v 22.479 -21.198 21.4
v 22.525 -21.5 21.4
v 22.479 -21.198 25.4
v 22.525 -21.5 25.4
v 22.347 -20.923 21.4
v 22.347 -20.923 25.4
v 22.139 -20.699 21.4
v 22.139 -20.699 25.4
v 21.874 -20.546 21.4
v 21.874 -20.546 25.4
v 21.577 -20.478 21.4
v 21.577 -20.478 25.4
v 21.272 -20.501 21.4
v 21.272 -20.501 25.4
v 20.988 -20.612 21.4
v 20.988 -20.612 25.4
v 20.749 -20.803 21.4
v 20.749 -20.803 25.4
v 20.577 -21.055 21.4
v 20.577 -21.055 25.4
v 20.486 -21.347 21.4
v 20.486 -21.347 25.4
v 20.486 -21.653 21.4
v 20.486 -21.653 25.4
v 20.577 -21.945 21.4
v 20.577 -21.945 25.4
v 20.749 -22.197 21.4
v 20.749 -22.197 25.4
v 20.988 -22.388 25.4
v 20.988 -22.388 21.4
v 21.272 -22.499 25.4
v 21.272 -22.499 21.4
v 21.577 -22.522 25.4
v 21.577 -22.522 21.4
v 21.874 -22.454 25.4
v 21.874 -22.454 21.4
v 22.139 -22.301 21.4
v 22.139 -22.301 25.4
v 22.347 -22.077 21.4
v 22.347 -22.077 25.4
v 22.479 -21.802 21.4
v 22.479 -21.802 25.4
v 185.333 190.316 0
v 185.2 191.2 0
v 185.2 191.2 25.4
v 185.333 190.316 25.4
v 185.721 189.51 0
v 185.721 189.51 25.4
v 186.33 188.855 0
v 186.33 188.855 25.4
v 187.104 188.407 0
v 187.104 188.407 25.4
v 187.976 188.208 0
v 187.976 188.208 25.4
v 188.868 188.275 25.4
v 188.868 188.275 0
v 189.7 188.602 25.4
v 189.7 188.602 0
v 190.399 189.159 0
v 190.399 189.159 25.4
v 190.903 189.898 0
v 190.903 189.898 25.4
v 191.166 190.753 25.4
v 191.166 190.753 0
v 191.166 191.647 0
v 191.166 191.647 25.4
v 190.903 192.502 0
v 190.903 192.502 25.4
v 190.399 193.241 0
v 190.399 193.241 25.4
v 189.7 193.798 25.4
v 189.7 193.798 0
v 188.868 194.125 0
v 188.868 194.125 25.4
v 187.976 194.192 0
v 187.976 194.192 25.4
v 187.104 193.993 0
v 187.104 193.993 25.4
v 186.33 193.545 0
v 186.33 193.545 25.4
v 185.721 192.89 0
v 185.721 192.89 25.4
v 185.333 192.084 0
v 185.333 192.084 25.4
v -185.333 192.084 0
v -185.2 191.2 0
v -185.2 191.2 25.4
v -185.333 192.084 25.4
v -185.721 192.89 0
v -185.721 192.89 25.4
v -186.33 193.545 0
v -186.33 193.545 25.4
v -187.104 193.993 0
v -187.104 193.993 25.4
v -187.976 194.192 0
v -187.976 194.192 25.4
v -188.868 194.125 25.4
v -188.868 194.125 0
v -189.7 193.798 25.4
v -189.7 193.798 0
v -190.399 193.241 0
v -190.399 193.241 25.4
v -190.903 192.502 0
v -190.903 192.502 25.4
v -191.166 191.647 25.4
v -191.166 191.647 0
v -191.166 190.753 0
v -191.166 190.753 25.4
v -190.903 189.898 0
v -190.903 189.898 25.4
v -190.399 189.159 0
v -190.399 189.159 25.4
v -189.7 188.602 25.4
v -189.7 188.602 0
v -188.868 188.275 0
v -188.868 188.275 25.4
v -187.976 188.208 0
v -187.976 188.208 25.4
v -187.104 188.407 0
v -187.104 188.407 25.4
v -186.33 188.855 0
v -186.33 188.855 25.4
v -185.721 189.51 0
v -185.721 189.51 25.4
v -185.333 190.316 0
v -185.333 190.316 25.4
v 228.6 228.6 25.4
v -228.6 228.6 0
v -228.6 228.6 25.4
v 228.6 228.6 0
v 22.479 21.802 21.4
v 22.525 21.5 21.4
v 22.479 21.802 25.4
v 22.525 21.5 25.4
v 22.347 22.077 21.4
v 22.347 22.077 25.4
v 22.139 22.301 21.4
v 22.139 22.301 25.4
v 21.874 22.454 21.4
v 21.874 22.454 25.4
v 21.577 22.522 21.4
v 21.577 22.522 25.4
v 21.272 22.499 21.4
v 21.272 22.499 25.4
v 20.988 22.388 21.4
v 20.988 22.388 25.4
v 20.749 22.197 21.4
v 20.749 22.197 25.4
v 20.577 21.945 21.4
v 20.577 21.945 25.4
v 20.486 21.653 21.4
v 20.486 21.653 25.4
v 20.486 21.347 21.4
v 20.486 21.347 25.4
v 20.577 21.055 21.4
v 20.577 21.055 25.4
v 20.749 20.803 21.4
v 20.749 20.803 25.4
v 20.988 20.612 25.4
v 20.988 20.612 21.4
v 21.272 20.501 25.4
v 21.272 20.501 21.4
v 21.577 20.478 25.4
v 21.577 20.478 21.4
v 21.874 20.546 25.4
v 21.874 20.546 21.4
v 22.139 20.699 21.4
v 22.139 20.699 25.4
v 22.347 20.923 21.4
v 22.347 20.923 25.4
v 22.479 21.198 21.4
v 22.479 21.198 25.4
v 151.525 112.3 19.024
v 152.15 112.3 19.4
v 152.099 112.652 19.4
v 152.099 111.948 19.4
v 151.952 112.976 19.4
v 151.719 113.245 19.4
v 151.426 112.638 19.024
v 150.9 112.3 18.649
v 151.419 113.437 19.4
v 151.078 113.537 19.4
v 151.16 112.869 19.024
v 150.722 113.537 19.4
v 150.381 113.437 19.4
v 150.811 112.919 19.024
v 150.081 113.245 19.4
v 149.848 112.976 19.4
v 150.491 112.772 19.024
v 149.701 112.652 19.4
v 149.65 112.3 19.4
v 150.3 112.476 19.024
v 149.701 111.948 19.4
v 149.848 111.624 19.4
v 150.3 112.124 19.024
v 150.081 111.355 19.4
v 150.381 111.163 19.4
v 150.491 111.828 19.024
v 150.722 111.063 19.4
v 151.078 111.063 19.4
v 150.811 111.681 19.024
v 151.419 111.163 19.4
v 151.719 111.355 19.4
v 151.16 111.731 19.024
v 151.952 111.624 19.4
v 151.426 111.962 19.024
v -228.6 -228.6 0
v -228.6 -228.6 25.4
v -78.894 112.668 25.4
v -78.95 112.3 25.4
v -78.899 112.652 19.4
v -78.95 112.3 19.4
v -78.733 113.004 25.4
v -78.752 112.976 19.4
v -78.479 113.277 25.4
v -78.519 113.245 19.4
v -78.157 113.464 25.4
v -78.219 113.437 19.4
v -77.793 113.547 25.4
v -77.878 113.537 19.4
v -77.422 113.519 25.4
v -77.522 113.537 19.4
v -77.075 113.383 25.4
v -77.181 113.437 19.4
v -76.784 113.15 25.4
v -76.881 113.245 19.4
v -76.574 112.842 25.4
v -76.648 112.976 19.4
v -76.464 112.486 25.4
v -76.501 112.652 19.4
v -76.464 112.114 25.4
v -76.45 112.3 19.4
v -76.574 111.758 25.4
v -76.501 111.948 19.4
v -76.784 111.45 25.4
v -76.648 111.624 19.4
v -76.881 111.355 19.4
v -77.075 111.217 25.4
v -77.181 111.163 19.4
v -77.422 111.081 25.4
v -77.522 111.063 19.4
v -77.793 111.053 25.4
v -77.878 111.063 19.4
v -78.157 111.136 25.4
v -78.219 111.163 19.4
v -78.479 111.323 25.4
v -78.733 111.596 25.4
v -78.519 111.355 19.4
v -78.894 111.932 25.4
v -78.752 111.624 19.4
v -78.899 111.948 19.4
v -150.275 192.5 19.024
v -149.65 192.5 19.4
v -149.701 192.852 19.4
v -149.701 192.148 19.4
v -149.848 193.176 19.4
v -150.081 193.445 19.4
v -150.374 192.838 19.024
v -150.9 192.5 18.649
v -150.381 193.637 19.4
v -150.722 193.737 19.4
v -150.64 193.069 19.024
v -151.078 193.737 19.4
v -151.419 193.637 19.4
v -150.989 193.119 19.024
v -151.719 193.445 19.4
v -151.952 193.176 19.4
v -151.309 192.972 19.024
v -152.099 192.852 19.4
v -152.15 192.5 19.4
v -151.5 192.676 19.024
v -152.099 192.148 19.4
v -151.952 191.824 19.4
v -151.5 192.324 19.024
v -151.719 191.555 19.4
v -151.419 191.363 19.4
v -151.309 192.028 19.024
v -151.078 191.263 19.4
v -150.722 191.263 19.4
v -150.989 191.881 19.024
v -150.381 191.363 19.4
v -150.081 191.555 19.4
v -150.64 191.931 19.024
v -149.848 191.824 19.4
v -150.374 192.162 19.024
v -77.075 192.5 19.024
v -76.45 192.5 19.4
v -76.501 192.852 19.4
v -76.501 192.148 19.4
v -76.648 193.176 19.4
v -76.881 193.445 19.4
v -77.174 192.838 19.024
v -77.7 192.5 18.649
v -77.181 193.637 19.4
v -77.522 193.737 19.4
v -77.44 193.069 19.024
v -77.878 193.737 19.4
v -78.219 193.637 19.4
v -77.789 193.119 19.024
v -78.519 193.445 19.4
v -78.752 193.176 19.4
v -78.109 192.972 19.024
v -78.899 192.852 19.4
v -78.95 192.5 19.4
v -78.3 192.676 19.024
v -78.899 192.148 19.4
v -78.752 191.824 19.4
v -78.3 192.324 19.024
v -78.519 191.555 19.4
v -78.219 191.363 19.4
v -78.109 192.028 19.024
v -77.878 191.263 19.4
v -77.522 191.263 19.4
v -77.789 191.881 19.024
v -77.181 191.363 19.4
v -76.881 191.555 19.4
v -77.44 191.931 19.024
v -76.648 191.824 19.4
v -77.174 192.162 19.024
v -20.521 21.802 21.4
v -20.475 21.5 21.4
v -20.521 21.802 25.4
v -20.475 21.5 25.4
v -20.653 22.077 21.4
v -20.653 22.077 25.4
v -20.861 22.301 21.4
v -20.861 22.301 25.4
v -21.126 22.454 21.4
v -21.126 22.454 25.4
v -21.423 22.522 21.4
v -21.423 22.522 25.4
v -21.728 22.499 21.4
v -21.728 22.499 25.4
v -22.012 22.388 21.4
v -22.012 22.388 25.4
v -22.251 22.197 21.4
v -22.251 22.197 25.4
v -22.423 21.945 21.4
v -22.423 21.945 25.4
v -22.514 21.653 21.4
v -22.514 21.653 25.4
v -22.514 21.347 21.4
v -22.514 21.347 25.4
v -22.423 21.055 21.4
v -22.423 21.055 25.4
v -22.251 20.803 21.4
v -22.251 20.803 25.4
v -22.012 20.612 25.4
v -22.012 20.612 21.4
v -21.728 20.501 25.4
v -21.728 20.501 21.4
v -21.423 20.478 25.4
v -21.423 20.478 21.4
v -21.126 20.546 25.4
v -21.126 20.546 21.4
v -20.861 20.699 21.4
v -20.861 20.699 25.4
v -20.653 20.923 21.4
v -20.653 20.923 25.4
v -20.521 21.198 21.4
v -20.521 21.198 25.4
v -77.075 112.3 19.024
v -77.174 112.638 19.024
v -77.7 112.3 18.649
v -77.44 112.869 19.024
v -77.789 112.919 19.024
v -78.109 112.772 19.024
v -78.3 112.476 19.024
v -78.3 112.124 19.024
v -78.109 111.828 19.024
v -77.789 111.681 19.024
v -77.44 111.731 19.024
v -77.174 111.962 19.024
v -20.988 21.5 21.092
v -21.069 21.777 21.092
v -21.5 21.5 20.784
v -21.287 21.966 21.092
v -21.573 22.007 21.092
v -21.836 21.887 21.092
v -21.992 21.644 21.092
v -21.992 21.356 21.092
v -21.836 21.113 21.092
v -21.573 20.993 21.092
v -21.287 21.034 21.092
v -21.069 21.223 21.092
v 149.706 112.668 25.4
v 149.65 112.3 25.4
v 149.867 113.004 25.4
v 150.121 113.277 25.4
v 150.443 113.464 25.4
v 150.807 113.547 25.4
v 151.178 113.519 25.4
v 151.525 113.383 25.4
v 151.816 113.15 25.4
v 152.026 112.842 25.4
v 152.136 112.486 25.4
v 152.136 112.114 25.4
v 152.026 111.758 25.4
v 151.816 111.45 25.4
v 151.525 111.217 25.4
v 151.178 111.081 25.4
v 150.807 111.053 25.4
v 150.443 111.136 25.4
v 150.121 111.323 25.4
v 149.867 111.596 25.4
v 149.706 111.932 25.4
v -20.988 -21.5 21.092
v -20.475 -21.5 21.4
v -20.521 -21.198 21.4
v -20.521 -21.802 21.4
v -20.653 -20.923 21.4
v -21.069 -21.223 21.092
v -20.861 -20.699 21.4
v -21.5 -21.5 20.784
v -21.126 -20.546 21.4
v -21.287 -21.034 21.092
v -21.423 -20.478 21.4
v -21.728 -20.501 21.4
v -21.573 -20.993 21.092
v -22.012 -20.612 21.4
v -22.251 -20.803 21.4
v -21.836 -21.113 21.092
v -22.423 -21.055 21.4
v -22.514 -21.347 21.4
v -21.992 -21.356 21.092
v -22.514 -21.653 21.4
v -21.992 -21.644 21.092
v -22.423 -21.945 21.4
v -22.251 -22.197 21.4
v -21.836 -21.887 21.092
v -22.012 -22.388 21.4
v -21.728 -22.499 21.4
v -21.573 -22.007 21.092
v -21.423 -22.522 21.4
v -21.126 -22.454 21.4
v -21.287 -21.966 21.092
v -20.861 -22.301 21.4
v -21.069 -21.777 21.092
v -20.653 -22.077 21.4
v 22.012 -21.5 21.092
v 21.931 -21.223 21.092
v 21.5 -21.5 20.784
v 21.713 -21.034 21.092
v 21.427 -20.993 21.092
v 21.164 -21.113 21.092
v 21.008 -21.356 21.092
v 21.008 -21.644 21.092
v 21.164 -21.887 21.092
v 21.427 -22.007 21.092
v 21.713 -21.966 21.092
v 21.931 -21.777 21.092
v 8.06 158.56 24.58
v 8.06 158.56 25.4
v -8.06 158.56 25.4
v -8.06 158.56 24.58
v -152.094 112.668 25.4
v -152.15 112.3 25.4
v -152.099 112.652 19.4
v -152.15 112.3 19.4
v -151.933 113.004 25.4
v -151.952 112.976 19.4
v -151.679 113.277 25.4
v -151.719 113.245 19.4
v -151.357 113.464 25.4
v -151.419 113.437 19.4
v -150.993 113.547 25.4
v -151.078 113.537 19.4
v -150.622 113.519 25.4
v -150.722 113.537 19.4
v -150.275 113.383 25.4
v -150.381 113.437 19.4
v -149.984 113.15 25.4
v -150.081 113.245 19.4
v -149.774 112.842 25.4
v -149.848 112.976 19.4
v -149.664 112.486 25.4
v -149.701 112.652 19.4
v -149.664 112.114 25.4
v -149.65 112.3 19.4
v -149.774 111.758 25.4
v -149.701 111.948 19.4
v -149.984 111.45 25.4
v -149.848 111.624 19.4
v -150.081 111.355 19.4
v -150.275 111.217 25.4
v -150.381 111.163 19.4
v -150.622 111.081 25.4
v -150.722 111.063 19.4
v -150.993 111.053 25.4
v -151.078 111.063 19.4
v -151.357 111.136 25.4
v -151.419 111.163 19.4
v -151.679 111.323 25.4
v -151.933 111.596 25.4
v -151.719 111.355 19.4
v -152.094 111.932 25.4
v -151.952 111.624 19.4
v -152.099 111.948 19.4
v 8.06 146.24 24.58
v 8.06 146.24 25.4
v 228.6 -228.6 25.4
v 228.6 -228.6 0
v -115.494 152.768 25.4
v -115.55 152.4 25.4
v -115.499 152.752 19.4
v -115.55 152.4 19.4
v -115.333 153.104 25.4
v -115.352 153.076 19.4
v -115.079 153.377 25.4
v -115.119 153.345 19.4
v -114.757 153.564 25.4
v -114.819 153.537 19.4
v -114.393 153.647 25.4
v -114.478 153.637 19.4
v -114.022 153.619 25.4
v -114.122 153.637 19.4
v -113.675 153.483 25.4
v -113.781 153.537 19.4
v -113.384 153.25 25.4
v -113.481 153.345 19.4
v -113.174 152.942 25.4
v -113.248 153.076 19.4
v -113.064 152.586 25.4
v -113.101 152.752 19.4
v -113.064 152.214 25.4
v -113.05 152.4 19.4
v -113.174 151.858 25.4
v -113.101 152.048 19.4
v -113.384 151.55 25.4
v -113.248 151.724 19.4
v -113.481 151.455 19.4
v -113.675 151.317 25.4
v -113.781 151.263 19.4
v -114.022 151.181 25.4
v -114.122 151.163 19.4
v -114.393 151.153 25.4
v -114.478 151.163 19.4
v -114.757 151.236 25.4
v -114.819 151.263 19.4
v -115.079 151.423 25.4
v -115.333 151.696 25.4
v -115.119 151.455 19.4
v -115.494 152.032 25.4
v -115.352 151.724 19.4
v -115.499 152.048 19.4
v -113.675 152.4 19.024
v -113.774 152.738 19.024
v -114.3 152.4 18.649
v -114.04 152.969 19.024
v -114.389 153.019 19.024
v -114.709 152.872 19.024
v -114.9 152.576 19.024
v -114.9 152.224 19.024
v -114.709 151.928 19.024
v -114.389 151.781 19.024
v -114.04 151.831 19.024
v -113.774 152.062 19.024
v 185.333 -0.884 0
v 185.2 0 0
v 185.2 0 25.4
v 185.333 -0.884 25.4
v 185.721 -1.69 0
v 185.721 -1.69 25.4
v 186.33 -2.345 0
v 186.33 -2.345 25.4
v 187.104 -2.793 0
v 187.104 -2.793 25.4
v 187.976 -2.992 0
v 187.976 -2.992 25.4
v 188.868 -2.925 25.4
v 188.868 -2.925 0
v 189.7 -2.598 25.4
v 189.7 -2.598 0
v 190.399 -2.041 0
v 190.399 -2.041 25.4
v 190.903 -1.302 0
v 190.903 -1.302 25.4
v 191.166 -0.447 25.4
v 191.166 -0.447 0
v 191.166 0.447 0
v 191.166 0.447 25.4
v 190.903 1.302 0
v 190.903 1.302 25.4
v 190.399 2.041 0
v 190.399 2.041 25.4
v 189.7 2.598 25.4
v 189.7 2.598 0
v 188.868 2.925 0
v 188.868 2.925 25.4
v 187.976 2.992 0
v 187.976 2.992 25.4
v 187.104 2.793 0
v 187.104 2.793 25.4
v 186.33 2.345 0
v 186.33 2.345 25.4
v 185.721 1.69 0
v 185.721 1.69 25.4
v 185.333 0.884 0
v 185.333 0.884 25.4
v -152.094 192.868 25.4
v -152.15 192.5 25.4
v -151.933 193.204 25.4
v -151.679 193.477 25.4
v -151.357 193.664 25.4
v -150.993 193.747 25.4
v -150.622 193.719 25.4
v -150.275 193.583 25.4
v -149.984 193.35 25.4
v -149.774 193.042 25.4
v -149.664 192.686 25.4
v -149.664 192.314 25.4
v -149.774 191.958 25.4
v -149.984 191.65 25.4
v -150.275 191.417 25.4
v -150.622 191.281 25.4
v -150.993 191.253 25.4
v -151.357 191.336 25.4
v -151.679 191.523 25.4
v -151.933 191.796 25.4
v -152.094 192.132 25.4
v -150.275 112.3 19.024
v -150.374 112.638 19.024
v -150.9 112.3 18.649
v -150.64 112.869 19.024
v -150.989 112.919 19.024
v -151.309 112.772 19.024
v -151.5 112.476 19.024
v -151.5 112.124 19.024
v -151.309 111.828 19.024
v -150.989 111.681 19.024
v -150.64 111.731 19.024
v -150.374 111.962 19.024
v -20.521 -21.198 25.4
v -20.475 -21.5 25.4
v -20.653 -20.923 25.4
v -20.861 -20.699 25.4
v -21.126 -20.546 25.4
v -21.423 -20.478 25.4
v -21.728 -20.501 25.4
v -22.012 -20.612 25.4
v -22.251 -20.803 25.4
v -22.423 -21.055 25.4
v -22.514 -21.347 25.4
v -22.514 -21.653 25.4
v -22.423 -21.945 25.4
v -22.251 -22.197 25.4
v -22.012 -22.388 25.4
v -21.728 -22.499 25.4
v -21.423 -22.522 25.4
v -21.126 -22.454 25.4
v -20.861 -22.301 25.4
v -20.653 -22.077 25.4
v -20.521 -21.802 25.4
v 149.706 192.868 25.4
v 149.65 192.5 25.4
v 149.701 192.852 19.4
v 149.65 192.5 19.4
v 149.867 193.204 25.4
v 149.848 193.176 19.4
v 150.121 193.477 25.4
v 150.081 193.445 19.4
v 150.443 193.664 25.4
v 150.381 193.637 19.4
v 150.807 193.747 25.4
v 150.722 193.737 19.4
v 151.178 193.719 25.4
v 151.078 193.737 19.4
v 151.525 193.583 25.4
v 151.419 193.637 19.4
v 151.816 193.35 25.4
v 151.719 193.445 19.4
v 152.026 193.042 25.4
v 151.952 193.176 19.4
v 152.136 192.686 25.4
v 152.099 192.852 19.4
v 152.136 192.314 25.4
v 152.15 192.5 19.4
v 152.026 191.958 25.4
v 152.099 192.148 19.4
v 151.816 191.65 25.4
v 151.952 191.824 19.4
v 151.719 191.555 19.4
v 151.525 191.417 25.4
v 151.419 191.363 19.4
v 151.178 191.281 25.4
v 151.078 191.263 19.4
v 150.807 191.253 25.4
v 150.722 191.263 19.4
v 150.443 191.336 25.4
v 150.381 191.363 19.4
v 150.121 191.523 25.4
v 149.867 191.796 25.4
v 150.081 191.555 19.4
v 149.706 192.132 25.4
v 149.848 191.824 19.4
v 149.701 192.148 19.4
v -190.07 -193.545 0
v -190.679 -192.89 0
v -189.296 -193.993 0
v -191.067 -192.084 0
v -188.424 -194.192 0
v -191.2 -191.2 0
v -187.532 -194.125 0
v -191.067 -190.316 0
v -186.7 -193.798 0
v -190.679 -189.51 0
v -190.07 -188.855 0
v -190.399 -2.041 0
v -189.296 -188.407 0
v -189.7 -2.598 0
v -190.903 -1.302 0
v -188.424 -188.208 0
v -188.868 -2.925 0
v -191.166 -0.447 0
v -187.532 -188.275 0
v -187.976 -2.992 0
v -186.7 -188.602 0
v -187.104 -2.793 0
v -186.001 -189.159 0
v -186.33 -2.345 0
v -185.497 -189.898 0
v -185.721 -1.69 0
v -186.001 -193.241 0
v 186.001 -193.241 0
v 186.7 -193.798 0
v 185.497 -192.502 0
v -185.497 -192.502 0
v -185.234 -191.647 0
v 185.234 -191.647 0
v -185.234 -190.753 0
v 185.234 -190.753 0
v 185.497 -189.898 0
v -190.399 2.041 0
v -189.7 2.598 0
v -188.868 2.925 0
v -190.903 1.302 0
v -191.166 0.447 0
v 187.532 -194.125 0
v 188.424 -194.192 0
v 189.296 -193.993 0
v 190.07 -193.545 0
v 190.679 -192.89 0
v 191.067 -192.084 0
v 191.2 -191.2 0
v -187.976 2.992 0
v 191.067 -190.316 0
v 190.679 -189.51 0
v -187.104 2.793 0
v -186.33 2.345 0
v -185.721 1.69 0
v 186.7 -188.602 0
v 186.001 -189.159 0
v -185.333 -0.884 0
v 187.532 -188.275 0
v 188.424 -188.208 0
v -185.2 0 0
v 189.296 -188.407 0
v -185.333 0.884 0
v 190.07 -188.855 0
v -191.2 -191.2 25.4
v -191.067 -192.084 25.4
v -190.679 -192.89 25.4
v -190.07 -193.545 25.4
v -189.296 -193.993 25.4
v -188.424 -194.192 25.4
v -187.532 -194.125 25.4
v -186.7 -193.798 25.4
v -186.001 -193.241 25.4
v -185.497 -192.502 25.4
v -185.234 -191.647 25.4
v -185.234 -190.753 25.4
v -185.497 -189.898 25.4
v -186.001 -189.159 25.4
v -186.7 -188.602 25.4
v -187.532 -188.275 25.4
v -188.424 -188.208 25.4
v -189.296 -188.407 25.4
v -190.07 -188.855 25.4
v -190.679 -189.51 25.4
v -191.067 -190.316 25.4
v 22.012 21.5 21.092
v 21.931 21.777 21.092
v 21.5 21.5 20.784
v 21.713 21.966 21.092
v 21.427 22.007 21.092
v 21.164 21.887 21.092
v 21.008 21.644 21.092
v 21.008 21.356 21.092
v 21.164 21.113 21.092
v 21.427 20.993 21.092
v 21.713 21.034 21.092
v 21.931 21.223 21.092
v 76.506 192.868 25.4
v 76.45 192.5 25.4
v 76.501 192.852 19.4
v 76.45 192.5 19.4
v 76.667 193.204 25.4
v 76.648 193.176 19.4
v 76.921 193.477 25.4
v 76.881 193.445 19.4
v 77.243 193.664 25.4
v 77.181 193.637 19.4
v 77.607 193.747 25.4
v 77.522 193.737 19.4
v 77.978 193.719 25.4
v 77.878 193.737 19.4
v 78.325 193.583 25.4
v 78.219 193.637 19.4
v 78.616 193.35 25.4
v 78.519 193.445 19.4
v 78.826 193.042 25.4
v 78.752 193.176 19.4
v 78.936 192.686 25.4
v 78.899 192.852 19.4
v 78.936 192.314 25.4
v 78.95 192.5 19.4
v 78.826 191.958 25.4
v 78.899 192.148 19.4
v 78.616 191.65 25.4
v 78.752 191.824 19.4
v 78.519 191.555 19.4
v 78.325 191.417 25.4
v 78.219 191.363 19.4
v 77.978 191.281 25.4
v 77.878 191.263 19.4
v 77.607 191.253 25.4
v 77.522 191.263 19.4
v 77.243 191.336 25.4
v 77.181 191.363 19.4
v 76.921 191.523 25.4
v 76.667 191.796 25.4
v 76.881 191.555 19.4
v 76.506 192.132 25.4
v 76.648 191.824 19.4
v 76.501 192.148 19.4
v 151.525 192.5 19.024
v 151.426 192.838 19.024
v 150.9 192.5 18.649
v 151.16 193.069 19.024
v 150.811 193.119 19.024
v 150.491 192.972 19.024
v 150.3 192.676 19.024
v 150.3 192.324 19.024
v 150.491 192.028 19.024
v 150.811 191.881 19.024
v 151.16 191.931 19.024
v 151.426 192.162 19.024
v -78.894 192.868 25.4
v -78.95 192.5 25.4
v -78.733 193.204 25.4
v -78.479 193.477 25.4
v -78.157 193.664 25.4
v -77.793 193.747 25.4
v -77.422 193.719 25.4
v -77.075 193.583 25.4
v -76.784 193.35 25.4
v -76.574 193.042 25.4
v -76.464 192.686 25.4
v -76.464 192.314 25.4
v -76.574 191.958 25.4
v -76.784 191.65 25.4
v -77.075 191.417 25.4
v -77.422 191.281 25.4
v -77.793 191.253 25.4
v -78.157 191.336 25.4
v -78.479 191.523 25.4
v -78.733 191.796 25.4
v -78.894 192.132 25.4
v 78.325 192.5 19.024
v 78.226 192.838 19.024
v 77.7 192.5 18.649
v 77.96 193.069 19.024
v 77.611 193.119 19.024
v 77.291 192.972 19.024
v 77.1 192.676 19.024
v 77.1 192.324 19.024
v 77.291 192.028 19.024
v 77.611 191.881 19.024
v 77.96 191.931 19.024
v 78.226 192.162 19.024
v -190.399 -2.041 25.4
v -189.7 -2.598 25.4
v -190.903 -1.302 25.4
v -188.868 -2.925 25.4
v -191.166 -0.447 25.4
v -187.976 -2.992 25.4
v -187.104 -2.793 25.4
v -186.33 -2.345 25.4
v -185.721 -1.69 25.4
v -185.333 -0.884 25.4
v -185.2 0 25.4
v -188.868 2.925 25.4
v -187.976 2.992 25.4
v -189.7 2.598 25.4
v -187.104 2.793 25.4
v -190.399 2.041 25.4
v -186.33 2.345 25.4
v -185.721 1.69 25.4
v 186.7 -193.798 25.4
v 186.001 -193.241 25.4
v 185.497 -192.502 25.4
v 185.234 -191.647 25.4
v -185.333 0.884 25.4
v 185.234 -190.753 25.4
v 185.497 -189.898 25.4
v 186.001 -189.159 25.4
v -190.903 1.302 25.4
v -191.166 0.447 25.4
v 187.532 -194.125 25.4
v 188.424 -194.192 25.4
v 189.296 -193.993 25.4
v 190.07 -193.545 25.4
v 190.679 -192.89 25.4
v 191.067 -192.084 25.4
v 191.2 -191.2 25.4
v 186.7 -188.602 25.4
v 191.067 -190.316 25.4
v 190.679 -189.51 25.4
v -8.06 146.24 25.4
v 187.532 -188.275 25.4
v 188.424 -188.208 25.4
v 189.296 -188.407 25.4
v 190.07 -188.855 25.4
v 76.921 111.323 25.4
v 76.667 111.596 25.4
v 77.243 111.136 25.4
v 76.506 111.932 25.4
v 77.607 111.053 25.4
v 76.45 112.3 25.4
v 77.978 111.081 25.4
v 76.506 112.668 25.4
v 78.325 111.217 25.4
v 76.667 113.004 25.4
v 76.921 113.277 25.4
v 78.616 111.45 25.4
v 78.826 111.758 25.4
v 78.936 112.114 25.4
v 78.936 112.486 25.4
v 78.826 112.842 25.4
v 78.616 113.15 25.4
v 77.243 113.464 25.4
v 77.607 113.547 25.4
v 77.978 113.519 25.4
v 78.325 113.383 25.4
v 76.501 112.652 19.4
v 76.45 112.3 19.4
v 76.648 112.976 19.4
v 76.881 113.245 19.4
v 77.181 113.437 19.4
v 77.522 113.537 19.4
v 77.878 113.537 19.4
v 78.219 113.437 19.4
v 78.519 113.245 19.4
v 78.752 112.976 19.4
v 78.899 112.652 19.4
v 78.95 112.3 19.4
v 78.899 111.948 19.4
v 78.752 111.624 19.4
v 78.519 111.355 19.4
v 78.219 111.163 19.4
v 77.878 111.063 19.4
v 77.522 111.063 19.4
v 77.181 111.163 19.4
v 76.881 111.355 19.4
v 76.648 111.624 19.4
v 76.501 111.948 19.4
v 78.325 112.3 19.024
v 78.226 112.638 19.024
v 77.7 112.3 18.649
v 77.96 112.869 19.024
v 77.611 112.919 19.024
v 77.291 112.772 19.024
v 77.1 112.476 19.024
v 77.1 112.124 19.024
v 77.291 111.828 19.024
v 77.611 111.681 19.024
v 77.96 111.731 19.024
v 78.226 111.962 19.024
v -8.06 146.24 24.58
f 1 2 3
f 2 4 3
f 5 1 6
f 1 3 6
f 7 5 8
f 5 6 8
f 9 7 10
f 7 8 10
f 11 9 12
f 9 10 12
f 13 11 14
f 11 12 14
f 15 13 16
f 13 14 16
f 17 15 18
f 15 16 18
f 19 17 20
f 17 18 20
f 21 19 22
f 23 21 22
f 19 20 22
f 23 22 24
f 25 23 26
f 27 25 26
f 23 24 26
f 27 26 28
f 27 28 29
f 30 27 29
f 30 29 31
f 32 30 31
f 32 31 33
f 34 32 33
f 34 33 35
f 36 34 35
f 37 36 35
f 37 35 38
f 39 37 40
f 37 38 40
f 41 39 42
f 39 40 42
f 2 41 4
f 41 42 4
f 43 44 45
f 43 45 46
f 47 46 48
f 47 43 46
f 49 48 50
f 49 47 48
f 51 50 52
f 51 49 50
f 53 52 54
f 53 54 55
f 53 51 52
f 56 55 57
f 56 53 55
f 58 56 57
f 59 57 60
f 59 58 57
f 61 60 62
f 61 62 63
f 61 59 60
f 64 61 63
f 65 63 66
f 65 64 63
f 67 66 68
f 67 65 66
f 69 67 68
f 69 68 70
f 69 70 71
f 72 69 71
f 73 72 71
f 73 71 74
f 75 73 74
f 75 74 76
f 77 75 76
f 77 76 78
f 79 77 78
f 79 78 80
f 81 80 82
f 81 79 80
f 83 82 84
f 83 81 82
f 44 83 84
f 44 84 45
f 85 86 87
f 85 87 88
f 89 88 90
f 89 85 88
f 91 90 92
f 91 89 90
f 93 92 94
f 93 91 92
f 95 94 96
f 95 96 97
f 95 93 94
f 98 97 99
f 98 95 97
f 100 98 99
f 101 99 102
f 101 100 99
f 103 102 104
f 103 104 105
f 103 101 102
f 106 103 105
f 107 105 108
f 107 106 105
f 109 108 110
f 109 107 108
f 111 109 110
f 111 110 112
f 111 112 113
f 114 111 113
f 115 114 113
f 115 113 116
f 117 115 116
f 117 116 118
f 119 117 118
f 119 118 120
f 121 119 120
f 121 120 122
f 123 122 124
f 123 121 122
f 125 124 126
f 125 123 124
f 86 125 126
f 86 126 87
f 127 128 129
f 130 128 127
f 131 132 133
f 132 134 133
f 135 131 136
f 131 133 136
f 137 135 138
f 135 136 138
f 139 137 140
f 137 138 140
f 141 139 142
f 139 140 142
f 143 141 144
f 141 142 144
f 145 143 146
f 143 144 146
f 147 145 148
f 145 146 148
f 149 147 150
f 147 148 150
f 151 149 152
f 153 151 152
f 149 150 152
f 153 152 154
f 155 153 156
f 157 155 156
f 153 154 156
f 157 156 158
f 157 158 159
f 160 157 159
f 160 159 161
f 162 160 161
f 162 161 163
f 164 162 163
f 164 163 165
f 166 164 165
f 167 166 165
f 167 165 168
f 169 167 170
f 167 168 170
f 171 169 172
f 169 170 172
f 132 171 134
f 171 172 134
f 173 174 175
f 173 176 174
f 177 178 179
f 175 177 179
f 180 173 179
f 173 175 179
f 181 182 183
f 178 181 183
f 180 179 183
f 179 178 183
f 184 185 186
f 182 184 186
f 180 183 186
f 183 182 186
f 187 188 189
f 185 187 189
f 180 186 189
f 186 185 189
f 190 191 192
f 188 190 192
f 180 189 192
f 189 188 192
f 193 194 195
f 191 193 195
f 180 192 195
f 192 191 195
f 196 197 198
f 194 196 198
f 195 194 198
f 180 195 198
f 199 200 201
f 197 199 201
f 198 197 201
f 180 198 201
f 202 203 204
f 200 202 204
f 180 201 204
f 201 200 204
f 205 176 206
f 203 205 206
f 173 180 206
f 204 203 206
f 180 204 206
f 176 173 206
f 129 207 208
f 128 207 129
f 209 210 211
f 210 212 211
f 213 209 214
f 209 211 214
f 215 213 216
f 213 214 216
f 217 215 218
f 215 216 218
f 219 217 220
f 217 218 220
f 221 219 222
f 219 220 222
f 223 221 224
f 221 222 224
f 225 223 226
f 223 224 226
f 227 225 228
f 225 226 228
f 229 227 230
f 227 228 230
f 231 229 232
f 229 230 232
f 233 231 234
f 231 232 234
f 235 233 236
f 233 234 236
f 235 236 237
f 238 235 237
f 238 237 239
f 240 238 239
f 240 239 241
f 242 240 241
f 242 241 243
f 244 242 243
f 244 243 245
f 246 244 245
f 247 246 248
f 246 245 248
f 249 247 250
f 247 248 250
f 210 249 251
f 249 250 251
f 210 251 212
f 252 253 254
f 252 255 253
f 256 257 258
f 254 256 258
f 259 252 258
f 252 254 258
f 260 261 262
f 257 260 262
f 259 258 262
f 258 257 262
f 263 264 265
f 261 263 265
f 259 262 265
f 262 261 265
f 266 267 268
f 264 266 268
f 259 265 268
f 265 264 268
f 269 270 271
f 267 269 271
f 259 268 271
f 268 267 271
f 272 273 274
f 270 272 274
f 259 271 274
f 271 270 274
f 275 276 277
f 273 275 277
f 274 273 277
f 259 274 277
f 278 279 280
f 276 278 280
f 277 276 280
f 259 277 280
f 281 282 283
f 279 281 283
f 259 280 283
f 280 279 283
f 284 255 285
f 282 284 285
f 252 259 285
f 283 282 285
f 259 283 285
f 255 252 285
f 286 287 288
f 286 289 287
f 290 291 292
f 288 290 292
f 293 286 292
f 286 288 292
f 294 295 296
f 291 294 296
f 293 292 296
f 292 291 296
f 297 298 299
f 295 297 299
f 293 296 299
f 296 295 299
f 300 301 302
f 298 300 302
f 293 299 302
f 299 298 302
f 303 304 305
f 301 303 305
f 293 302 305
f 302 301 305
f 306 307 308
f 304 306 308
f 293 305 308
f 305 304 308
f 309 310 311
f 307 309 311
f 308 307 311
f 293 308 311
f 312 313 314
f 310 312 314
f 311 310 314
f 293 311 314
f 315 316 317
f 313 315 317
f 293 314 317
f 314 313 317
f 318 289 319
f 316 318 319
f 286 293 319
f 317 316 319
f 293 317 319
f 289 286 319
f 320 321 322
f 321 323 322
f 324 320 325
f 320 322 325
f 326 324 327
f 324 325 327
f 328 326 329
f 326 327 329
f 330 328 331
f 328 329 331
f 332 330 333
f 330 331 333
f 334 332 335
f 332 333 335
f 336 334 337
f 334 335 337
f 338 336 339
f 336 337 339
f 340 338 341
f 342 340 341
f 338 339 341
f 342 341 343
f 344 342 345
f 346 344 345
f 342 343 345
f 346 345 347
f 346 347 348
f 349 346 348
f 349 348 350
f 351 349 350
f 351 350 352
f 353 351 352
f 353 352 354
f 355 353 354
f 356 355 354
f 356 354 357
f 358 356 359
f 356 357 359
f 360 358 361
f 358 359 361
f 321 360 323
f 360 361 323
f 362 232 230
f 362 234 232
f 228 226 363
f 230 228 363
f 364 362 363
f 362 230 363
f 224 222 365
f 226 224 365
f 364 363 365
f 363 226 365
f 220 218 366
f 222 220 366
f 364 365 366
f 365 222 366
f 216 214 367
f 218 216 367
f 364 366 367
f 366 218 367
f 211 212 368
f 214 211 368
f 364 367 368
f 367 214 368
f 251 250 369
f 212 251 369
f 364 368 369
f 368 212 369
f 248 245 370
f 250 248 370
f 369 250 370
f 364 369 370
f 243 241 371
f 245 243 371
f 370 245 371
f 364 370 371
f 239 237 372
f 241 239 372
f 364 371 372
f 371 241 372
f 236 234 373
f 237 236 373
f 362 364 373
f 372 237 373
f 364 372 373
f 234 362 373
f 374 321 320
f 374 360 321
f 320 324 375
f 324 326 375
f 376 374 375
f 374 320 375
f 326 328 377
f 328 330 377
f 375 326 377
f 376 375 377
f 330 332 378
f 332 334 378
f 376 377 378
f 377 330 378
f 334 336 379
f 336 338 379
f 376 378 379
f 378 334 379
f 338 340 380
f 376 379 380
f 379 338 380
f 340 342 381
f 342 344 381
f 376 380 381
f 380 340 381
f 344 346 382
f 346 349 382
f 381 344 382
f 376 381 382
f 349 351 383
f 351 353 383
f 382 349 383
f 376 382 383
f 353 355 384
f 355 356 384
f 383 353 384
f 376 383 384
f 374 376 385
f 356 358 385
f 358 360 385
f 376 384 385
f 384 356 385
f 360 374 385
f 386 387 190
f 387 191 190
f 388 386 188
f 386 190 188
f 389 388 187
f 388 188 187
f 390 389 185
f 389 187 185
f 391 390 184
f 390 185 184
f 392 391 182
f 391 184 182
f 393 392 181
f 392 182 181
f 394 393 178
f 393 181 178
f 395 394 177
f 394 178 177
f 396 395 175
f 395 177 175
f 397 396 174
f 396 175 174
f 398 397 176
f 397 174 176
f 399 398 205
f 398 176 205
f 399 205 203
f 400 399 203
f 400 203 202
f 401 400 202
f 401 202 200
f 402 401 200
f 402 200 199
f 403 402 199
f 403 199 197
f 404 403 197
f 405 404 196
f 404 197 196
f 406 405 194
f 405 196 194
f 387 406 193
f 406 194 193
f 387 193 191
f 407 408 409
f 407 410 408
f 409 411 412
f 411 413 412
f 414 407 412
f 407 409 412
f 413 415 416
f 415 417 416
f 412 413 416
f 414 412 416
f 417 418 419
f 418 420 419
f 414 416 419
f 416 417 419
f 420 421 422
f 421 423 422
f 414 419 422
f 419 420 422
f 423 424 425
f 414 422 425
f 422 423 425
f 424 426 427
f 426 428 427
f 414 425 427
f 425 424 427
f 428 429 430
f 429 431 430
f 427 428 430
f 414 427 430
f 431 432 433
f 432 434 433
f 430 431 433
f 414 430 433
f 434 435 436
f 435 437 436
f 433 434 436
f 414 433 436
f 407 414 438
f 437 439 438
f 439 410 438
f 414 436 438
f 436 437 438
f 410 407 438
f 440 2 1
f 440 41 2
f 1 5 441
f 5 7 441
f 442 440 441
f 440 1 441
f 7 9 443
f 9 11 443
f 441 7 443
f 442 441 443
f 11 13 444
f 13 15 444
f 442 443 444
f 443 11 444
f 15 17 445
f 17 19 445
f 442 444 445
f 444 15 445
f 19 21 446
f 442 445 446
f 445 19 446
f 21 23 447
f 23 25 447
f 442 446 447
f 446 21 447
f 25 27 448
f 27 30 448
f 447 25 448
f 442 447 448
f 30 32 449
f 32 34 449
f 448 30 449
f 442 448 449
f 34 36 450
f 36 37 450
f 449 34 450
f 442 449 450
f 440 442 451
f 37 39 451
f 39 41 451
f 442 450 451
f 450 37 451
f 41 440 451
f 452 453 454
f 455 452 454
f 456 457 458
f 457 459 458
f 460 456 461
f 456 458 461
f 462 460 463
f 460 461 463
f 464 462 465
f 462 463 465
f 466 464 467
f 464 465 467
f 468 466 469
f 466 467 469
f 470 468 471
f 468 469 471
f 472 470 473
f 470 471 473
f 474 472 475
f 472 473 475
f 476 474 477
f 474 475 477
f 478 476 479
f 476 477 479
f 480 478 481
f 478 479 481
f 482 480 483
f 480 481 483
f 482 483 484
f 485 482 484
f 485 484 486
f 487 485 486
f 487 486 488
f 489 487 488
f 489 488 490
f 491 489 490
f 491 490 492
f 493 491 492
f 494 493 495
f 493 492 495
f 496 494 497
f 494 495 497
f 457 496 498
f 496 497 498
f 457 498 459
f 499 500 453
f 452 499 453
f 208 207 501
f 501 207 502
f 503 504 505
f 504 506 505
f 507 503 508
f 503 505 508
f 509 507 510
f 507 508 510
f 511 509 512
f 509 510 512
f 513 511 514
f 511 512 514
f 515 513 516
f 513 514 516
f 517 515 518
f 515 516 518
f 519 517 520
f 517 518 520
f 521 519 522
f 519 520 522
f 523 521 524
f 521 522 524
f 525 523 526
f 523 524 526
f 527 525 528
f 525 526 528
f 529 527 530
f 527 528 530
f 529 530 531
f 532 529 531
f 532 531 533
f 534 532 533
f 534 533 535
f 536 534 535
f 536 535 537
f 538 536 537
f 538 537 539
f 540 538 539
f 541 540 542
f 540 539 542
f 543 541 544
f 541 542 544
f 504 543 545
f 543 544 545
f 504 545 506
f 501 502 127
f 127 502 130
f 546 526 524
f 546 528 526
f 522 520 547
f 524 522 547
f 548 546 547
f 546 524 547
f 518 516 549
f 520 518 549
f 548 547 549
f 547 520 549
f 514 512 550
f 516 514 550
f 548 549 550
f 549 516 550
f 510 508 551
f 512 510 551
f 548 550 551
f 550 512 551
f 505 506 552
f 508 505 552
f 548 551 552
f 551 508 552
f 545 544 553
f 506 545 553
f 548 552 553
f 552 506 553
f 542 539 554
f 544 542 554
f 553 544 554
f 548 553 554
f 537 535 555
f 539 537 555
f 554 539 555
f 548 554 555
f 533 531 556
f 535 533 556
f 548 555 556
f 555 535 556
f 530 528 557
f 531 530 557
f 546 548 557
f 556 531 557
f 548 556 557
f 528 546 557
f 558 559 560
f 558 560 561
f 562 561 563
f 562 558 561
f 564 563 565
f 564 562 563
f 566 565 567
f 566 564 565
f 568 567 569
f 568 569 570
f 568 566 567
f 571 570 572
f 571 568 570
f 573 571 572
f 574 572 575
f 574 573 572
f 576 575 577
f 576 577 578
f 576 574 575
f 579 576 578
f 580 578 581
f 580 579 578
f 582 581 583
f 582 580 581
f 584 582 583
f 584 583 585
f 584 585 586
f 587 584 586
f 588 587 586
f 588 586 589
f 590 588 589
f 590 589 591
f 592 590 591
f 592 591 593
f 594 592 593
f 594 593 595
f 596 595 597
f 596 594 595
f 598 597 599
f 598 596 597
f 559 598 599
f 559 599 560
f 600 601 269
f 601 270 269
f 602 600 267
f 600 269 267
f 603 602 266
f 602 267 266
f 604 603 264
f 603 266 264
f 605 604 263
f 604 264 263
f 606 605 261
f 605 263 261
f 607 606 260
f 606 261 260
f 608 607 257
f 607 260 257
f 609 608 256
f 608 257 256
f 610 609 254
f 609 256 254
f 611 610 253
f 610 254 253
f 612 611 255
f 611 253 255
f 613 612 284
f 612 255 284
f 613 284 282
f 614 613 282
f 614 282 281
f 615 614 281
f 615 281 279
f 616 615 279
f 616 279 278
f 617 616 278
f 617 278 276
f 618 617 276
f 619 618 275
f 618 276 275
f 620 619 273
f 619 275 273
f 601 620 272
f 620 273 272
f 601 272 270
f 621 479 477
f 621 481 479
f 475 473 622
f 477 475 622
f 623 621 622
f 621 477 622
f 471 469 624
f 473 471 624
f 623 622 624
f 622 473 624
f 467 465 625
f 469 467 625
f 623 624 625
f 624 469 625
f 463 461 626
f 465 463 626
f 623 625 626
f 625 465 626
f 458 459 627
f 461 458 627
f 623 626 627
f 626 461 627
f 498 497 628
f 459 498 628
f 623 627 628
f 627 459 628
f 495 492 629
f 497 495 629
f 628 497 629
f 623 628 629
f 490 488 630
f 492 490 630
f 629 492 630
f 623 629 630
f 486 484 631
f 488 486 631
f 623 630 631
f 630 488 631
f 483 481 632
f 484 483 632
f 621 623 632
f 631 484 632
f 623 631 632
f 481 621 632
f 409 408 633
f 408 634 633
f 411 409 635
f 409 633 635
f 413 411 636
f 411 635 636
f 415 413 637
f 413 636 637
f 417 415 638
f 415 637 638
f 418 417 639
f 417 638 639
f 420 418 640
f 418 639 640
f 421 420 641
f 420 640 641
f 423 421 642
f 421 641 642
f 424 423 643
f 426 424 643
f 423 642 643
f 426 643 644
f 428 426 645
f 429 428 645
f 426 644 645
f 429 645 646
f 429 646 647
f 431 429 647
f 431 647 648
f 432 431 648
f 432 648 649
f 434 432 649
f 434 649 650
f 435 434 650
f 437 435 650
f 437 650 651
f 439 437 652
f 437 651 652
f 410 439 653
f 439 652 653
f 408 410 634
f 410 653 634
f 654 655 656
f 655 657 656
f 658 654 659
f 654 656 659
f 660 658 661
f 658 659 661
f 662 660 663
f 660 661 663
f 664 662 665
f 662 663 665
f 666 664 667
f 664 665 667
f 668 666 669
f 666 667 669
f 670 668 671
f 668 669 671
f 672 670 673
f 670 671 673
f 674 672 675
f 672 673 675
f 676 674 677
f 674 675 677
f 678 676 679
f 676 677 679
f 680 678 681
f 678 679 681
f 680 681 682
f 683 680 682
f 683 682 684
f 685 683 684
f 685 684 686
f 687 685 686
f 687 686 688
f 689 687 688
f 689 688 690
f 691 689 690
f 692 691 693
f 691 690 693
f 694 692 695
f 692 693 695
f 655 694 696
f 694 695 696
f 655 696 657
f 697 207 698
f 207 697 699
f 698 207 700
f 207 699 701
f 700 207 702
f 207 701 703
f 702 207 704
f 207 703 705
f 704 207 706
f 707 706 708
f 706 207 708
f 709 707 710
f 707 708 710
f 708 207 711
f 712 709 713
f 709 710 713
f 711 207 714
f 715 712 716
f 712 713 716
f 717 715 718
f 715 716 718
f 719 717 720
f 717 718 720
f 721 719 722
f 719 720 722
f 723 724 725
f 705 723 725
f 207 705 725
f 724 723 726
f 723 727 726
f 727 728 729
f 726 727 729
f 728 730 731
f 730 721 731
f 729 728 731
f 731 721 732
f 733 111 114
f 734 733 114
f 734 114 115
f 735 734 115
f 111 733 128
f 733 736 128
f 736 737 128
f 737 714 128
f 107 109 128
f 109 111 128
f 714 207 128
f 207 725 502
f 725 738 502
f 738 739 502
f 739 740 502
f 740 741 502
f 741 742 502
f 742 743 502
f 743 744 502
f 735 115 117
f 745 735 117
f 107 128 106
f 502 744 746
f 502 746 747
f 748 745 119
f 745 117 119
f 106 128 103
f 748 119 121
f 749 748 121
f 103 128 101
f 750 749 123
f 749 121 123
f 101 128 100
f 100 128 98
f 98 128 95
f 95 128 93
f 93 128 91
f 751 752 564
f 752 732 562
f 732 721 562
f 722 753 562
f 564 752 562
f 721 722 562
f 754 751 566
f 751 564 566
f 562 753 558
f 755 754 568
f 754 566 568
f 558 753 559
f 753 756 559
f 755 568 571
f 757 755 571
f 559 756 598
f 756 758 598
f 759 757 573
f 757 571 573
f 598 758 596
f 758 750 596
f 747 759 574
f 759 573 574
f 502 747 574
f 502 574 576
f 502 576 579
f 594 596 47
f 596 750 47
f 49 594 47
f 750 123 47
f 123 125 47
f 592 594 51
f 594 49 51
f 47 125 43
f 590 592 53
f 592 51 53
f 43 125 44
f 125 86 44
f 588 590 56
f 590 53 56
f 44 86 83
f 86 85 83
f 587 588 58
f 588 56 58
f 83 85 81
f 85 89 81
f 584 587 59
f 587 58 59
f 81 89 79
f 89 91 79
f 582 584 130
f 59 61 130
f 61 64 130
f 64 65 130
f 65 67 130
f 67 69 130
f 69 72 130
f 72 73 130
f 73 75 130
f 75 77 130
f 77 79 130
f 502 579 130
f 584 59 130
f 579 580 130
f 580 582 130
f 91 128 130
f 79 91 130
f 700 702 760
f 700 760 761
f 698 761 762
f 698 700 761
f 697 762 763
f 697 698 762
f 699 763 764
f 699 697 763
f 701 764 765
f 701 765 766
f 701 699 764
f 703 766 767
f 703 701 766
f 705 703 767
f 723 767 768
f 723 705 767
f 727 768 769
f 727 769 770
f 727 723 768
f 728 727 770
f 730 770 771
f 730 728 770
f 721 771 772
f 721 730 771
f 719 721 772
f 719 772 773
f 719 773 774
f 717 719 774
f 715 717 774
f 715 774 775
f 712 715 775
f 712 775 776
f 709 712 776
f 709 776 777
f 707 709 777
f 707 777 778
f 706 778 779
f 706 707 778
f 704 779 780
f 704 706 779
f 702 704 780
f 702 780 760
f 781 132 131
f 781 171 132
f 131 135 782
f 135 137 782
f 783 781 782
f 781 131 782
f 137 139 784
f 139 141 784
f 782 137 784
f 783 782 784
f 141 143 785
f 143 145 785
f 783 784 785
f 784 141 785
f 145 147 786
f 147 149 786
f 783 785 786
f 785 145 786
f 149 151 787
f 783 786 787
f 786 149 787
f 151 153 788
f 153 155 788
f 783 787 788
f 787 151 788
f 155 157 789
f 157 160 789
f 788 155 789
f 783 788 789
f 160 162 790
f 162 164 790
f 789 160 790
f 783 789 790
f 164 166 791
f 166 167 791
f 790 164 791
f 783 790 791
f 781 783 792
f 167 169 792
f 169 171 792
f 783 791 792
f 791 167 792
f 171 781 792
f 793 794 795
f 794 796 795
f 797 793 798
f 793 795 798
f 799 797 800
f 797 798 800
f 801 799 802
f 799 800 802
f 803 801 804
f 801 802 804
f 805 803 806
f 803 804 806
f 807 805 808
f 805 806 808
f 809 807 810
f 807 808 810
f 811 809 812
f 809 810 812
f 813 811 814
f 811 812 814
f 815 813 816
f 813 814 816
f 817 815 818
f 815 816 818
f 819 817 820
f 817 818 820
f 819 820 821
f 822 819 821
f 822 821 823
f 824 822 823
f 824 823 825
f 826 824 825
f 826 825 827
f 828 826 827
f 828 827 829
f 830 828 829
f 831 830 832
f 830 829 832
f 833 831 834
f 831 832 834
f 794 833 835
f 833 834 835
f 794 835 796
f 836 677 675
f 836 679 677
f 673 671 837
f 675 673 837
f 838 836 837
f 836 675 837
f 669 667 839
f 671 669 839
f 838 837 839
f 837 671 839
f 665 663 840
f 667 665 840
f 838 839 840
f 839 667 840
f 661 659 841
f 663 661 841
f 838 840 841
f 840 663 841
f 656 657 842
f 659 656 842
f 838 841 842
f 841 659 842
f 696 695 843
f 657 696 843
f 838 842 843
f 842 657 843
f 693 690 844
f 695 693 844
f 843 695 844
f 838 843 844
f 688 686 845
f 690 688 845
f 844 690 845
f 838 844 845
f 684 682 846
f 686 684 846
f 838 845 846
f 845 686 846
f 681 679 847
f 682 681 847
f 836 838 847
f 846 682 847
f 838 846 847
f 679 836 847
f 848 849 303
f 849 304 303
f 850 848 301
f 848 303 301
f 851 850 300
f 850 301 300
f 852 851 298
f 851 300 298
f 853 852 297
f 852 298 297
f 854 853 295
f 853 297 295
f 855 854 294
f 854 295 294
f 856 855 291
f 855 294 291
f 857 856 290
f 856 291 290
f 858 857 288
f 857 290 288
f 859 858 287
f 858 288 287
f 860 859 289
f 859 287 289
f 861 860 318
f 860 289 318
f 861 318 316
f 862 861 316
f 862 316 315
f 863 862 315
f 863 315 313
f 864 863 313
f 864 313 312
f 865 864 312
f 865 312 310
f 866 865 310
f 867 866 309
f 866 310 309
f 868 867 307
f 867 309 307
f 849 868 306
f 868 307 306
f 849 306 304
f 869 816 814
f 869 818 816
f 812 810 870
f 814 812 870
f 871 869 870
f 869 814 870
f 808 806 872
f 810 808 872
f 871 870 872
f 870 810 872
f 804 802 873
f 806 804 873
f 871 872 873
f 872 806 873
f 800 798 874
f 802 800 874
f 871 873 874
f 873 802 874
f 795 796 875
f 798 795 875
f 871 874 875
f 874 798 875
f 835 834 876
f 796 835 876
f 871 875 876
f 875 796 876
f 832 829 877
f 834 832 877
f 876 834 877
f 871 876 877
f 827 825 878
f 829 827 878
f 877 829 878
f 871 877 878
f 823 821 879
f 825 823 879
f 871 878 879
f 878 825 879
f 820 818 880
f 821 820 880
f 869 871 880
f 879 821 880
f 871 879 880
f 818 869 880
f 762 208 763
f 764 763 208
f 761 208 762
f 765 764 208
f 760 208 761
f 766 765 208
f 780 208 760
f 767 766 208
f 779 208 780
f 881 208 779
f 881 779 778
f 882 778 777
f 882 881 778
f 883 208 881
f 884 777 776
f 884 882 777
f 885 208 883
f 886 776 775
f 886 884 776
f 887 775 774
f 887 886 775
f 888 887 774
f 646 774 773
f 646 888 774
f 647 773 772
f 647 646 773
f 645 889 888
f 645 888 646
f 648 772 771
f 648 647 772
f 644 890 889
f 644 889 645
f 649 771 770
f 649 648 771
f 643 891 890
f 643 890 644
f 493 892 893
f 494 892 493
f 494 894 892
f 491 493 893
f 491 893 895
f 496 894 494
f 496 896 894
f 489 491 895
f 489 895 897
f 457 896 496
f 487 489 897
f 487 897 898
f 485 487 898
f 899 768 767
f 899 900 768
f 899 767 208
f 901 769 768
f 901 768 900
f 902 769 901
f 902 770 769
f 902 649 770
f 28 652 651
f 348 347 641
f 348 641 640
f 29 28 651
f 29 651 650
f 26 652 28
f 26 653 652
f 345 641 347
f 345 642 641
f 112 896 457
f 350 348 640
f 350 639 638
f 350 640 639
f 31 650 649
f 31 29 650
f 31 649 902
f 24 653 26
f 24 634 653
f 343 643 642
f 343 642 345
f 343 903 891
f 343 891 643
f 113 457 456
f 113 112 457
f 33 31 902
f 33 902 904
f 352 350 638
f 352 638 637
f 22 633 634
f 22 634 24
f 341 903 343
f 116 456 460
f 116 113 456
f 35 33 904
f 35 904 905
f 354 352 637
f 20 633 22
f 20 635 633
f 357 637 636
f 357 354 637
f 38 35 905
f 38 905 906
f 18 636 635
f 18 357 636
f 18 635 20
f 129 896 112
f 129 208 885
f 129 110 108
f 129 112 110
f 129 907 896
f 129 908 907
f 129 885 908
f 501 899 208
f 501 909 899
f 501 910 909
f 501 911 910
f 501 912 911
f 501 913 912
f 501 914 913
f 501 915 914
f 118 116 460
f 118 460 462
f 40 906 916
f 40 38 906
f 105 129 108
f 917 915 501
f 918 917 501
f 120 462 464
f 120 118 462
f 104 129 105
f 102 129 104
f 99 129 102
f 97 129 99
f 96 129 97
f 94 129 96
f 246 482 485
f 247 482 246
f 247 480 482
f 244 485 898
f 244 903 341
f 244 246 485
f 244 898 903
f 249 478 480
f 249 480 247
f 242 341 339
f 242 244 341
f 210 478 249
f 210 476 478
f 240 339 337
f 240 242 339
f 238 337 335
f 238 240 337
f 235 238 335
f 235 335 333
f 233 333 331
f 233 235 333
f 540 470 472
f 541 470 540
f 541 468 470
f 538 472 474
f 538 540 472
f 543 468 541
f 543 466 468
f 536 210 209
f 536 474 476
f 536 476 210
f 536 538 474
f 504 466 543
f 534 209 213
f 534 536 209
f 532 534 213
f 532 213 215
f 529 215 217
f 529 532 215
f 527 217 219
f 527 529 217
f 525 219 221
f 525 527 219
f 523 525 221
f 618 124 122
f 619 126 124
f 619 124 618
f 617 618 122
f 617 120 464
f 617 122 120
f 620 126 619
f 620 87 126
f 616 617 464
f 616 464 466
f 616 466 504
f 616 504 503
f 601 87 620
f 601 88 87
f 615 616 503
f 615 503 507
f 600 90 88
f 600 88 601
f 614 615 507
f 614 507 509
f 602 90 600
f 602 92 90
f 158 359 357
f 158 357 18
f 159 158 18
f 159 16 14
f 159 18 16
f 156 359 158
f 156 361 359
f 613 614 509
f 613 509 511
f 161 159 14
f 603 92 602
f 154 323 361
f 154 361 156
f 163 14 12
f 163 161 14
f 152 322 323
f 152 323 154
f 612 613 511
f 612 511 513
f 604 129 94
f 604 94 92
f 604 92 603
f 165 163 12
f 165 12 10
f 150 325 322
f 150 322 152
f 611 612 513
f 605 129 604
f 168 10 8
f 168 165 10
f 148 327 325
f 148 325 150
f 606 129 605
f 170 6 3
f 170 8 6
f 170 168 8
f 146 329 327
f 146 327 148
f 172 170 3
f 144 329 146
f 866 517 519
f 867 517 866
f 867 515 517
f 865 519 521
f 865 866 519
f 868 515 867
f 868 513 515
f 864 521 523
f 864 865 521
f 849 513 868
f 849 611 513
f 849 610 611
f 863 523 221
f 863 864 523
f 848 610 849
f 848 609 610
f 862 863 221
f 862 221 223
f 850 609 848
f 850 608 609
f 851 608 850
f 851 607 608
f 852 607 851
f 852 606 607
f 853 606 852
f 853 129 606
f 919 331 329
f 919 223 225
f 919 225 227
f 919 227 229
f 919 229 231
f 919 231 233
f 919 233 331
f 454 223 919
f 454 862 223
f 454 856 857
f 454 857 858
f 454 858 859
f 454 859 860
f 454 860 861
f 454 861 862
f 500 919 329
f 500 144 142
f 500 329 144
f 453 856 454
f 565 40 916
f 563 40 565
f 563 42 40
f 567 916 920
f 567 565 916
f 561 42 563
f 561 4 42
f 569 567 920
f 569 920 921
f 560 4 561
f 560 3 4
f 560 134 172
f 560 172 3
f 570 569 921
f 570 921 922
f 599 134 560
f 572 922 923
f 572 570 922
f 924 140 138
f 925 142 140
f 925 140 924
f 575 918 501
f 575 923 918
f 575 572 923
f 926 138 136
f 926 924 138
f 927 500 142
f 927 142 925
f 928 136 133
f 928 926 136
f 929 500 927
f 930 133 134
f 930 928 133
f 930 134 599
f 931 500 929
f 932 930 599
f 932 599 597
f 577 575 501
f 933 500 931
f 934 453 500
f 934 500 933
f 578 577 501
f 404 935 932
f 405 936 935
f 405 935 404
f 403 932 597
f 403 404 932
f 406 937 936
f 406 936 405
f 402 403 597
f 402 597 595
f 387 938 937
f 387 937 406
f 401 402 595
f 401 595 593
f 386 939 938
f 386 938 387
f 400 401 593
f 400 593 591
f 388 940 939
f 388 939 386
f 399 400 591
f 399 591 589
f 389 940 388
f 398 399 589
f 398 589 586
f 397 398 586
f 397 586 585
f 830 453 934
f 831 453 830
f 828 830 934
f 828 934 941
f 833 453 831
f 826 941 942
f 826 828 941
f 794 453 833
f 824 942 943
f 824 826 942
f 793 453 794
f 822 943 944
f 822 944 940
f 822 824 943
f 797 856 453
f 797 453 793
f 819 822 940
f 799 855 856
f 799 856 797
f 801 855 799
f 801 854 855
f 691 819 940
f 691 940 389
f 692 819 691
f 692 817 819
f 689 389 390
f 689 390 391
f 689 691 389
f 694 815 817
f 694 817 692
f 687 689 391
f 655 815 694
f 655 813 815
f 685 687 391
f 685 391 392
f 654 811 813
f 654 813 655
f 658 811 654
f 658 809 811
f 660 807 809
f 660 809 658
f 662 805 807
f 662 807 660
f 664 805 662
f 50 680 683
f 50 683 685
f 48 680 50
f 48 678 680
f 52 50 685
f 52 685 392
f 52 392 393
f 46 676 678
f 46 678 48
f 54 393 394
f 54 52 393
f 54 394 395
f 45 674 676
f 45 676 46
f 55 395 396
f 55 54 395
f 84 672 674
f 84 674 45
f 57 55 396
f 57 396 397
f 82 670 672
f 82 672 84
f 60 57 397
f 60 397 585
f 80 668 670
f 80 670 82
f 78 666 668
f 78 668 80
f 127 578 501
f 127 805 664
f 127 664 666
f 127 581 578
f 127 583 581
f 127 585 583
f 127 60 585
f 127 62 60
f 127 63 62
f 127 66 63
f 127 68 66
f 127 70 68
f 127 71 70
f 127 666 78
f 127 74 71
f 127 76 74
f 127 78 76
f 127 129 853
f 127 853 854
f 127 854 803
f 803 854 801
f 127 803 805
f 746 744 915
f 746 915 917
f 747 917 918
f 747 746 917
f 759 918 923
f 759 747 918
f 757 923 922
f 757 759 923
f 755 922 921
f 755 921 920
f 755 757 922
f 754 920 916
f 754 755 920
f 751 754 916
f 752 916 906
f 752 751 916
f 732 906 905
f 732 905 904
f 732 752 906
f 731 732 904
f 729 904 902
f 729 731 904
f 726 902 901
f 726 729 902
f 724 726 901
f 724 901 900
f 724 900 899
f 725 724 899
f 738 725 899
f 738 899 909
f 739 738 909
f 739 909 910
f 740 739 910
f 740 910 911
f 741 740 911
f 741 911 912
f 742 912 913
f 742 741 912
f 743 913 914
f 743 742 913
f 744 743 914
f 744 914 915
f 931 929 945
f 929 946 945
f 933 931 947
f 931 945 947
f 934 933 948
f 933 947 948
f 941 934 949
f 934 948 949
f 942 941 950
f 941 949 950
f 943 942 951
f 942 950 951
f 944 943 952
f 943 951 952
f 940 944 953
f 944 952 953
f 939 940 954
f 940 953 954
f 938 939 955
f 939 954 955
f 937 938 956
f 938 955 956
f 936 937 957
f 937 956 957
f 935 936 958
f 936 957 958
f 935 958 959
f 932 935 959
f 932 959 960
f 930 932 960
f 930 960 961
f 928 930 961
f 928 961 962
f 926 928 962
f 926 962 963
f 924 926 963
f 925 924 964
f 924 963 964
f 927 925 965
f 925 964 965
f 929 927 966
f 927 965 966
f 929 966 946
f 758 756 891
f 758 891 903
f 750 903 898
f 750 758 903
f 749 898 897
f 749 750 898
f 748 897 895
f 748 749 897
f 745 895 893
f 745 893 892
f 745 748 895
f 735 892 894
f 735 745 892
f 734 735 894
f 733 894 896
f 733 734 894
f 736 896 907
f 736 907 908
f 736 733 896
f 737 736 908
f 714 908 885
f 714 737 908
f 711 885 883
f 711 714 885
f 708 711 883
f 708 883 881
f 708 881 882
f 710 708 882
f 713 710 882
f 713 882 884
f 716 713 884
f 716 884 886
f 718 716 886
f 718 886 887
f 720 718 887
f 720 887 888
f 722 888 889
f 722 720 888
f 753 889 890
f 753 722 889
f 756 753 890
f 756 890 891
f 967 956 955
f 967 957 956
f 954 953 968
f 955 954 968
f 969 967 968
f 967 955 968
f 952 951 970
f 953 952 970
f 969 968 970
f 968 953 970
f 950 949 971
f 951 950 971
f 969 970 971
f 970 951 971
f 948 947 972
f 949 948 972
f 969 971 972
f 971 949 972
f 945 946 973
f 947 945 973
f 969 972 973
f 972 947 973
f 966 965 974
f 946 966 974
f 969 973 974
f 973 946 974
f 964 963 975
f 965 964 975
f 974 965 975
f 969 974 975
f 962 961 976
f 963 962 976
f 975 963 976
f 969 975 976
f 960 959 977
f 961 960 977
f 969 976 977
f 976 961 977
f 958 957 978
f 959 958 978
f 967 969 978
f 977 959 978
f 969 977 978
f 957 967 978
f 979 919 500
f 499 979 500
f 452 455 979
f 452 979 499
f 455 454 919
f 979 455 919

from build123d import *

# Parameters (mm, degrees)
SKETCH1_W             = 457.2
SKETCH1_H             = 457.2
SKETCH1_R             = 3
BOSS_EXTRUDE1_DEPTH   = 25.4
M3_TAPPED_HOLE1_D     = 2.5
M3_TAPPED_HOLE1_DEPTH = 6
M3_TAPPED_HOLE1_TIP   = 0.751075774
CUT_EXTRUDE1_DEPTH    = 0.82


# Read off the part's stored shape, not the designer's step: M2.5 Tapped Hole1
with BuildPart() as part:
    # Sketch1 → Boss-Extrude1 (new body)
    with BuildSketch(Plane.XY):
        Rectangle(SKETCH1_W, SKETCH1_H)
        with Locations((-188.2, 191.2)):
            Circle(SKETCH1_R, mode=Mode.SUBTRACT)
        with Locations((-188.2, 0)):
            Circle(SKETCH1_R, mode=Mode.SUBTRACT)
        with Locations(Location((188.2, 191.2, 0), (0, 0, 180))):
            Circle(SKETCH1_R, mode=Mode.SUBTRACT)
        with Locations(Location((188.2, 0, 0), (0, 0, 180))):
            Circle(SKETCH1_R, mode=Mode.SUBTRACT)
        with Locations((188.2, -191.2)):
            Circle(SKETCH1_R, mode=Mode.SUBTRACT)
        with Locations(Location((-188.2, -191.2, 0), (0, 0, 180))):
            Circle(SKETCH1_R, mode=Mode.SUBTRACT)
    extrude(amount=BOSS_EXTRUDE1_DEPTH)

    # M2.5 Tapped Hole1 outline → M2.5 Tapped Hole1 (revolve, cut)
    with BuildSketch(Plane(origin=(21.5, 21.5, 0), x_dir=(1, 0, 0), z_dir=(0, -1, 0))):
        Polygon((0, 25.4), (0, 20.784117865), (1.025, 21.4), (1.025, 25.4), align=None)
    revolve(axis=Axis((21.5, 21.5, 0), (0, 0, 1)), mode=Mode.SUBTRACT)

    # M2.5 Tapped Hole1 2 outline → M2.5 Tapped Hole1 2 (revolve, cut)
    with BuildSketch(Plane(origin=(-21.5, -21.5, 0), x_dir=(1, 0, 0), z_dir=(0, -1, 0))):
        Polygon((0, 25.4), (0, 20.784117865), (1.025, 21.4), (1.025, 25.4), align=None)
    revolve(axis=Axis((-21.5, -21.5, 0), (0, 0, 1)), mode=Mode.SUBTRACT)

    # M2.5 Tapped Hole1 3 outline → M2.5 Tapped Hole1 3 (revolve, cut)
    with BuildSketch(Plane(origin=(-21.5, 21.5, 0), x_dir=(1, 0, 0), z_dir=(0, -1, 0))):
        Polygon((0, 25.4), (0, 20.784117865), (1.025, 21.4), (1.025, 25.4), align=None)
    revolve(axis=Axis((-21.5, 21.5, 0), (0, 0, 1)), mode=Mode.SUBTRACT)

    # M2.5 Tapped Hole1 4 outline → M2.5 Tapped Hole1 4 (revolve, cut)
    with BuildSketch(Plane(origin=(21.5, -21.5, 0), x_dir=(1, 0, 0), z_dir=(0, -1, 0))):
        Polygon((0, 25.4), (0, 20.784117865), (1.025, 21.4), (1.025, 25.4), align=None)
    revolve(axis=Axis((21.5, -21.5, 0), (0, 0, 1)), mode=Mode.SUBTRACT)

    # M3 Tapped Hole1
    with Locations(Plane.XY.offset(25.4)):
        with Locations((-114.3, 152.4), (-77.7, 112.3), (-150.9, 192.5), (-150.9, 112.3), (-77.7, 192.5), (150.9, 112.3), (77.7, 192.5), (150.9, 192.5), (77.7, 112.3)):
            Hole(M3_TAPPED_HOLE1_D / 2, depth=M3_TAPPED_HOLE1_DEPTH)
            with Locations((0, 0, -(M3_TAPPED_HOLE1_DEPTH + M3_TAPPED_HOLE1_TIP / 2))):  # 118° drill point
                Cone(0, M3_TAPPED_HOLE1_D / 2, M3_TAPPED_HOLE1_TIP, mode=Mode.SUBTRACT)

    # Sketch8 → Cut-Extrude1 (cut)
    with BuildSketch(Plane.XY.offset(25.4)):
        Polygon((0, 152.4), (-8.06, 158.56), (-8.06, 146.24), align=None)
        Polygon((8.06, 158.56), (-8.06, 158.56), (0, 152.4), align=None)
        Polygon((8.06, 146.24), (8.06, 158.56), (0, 152.4), align=None)
        Polygon((0, 152.4), (-8.06, 146.24), (8.06, 146.24), align=None)
    extrude(amount=-CUT_EXTRUDE1_DEPTH, mode=Mode.SUBTRACT)


solid = part.part
